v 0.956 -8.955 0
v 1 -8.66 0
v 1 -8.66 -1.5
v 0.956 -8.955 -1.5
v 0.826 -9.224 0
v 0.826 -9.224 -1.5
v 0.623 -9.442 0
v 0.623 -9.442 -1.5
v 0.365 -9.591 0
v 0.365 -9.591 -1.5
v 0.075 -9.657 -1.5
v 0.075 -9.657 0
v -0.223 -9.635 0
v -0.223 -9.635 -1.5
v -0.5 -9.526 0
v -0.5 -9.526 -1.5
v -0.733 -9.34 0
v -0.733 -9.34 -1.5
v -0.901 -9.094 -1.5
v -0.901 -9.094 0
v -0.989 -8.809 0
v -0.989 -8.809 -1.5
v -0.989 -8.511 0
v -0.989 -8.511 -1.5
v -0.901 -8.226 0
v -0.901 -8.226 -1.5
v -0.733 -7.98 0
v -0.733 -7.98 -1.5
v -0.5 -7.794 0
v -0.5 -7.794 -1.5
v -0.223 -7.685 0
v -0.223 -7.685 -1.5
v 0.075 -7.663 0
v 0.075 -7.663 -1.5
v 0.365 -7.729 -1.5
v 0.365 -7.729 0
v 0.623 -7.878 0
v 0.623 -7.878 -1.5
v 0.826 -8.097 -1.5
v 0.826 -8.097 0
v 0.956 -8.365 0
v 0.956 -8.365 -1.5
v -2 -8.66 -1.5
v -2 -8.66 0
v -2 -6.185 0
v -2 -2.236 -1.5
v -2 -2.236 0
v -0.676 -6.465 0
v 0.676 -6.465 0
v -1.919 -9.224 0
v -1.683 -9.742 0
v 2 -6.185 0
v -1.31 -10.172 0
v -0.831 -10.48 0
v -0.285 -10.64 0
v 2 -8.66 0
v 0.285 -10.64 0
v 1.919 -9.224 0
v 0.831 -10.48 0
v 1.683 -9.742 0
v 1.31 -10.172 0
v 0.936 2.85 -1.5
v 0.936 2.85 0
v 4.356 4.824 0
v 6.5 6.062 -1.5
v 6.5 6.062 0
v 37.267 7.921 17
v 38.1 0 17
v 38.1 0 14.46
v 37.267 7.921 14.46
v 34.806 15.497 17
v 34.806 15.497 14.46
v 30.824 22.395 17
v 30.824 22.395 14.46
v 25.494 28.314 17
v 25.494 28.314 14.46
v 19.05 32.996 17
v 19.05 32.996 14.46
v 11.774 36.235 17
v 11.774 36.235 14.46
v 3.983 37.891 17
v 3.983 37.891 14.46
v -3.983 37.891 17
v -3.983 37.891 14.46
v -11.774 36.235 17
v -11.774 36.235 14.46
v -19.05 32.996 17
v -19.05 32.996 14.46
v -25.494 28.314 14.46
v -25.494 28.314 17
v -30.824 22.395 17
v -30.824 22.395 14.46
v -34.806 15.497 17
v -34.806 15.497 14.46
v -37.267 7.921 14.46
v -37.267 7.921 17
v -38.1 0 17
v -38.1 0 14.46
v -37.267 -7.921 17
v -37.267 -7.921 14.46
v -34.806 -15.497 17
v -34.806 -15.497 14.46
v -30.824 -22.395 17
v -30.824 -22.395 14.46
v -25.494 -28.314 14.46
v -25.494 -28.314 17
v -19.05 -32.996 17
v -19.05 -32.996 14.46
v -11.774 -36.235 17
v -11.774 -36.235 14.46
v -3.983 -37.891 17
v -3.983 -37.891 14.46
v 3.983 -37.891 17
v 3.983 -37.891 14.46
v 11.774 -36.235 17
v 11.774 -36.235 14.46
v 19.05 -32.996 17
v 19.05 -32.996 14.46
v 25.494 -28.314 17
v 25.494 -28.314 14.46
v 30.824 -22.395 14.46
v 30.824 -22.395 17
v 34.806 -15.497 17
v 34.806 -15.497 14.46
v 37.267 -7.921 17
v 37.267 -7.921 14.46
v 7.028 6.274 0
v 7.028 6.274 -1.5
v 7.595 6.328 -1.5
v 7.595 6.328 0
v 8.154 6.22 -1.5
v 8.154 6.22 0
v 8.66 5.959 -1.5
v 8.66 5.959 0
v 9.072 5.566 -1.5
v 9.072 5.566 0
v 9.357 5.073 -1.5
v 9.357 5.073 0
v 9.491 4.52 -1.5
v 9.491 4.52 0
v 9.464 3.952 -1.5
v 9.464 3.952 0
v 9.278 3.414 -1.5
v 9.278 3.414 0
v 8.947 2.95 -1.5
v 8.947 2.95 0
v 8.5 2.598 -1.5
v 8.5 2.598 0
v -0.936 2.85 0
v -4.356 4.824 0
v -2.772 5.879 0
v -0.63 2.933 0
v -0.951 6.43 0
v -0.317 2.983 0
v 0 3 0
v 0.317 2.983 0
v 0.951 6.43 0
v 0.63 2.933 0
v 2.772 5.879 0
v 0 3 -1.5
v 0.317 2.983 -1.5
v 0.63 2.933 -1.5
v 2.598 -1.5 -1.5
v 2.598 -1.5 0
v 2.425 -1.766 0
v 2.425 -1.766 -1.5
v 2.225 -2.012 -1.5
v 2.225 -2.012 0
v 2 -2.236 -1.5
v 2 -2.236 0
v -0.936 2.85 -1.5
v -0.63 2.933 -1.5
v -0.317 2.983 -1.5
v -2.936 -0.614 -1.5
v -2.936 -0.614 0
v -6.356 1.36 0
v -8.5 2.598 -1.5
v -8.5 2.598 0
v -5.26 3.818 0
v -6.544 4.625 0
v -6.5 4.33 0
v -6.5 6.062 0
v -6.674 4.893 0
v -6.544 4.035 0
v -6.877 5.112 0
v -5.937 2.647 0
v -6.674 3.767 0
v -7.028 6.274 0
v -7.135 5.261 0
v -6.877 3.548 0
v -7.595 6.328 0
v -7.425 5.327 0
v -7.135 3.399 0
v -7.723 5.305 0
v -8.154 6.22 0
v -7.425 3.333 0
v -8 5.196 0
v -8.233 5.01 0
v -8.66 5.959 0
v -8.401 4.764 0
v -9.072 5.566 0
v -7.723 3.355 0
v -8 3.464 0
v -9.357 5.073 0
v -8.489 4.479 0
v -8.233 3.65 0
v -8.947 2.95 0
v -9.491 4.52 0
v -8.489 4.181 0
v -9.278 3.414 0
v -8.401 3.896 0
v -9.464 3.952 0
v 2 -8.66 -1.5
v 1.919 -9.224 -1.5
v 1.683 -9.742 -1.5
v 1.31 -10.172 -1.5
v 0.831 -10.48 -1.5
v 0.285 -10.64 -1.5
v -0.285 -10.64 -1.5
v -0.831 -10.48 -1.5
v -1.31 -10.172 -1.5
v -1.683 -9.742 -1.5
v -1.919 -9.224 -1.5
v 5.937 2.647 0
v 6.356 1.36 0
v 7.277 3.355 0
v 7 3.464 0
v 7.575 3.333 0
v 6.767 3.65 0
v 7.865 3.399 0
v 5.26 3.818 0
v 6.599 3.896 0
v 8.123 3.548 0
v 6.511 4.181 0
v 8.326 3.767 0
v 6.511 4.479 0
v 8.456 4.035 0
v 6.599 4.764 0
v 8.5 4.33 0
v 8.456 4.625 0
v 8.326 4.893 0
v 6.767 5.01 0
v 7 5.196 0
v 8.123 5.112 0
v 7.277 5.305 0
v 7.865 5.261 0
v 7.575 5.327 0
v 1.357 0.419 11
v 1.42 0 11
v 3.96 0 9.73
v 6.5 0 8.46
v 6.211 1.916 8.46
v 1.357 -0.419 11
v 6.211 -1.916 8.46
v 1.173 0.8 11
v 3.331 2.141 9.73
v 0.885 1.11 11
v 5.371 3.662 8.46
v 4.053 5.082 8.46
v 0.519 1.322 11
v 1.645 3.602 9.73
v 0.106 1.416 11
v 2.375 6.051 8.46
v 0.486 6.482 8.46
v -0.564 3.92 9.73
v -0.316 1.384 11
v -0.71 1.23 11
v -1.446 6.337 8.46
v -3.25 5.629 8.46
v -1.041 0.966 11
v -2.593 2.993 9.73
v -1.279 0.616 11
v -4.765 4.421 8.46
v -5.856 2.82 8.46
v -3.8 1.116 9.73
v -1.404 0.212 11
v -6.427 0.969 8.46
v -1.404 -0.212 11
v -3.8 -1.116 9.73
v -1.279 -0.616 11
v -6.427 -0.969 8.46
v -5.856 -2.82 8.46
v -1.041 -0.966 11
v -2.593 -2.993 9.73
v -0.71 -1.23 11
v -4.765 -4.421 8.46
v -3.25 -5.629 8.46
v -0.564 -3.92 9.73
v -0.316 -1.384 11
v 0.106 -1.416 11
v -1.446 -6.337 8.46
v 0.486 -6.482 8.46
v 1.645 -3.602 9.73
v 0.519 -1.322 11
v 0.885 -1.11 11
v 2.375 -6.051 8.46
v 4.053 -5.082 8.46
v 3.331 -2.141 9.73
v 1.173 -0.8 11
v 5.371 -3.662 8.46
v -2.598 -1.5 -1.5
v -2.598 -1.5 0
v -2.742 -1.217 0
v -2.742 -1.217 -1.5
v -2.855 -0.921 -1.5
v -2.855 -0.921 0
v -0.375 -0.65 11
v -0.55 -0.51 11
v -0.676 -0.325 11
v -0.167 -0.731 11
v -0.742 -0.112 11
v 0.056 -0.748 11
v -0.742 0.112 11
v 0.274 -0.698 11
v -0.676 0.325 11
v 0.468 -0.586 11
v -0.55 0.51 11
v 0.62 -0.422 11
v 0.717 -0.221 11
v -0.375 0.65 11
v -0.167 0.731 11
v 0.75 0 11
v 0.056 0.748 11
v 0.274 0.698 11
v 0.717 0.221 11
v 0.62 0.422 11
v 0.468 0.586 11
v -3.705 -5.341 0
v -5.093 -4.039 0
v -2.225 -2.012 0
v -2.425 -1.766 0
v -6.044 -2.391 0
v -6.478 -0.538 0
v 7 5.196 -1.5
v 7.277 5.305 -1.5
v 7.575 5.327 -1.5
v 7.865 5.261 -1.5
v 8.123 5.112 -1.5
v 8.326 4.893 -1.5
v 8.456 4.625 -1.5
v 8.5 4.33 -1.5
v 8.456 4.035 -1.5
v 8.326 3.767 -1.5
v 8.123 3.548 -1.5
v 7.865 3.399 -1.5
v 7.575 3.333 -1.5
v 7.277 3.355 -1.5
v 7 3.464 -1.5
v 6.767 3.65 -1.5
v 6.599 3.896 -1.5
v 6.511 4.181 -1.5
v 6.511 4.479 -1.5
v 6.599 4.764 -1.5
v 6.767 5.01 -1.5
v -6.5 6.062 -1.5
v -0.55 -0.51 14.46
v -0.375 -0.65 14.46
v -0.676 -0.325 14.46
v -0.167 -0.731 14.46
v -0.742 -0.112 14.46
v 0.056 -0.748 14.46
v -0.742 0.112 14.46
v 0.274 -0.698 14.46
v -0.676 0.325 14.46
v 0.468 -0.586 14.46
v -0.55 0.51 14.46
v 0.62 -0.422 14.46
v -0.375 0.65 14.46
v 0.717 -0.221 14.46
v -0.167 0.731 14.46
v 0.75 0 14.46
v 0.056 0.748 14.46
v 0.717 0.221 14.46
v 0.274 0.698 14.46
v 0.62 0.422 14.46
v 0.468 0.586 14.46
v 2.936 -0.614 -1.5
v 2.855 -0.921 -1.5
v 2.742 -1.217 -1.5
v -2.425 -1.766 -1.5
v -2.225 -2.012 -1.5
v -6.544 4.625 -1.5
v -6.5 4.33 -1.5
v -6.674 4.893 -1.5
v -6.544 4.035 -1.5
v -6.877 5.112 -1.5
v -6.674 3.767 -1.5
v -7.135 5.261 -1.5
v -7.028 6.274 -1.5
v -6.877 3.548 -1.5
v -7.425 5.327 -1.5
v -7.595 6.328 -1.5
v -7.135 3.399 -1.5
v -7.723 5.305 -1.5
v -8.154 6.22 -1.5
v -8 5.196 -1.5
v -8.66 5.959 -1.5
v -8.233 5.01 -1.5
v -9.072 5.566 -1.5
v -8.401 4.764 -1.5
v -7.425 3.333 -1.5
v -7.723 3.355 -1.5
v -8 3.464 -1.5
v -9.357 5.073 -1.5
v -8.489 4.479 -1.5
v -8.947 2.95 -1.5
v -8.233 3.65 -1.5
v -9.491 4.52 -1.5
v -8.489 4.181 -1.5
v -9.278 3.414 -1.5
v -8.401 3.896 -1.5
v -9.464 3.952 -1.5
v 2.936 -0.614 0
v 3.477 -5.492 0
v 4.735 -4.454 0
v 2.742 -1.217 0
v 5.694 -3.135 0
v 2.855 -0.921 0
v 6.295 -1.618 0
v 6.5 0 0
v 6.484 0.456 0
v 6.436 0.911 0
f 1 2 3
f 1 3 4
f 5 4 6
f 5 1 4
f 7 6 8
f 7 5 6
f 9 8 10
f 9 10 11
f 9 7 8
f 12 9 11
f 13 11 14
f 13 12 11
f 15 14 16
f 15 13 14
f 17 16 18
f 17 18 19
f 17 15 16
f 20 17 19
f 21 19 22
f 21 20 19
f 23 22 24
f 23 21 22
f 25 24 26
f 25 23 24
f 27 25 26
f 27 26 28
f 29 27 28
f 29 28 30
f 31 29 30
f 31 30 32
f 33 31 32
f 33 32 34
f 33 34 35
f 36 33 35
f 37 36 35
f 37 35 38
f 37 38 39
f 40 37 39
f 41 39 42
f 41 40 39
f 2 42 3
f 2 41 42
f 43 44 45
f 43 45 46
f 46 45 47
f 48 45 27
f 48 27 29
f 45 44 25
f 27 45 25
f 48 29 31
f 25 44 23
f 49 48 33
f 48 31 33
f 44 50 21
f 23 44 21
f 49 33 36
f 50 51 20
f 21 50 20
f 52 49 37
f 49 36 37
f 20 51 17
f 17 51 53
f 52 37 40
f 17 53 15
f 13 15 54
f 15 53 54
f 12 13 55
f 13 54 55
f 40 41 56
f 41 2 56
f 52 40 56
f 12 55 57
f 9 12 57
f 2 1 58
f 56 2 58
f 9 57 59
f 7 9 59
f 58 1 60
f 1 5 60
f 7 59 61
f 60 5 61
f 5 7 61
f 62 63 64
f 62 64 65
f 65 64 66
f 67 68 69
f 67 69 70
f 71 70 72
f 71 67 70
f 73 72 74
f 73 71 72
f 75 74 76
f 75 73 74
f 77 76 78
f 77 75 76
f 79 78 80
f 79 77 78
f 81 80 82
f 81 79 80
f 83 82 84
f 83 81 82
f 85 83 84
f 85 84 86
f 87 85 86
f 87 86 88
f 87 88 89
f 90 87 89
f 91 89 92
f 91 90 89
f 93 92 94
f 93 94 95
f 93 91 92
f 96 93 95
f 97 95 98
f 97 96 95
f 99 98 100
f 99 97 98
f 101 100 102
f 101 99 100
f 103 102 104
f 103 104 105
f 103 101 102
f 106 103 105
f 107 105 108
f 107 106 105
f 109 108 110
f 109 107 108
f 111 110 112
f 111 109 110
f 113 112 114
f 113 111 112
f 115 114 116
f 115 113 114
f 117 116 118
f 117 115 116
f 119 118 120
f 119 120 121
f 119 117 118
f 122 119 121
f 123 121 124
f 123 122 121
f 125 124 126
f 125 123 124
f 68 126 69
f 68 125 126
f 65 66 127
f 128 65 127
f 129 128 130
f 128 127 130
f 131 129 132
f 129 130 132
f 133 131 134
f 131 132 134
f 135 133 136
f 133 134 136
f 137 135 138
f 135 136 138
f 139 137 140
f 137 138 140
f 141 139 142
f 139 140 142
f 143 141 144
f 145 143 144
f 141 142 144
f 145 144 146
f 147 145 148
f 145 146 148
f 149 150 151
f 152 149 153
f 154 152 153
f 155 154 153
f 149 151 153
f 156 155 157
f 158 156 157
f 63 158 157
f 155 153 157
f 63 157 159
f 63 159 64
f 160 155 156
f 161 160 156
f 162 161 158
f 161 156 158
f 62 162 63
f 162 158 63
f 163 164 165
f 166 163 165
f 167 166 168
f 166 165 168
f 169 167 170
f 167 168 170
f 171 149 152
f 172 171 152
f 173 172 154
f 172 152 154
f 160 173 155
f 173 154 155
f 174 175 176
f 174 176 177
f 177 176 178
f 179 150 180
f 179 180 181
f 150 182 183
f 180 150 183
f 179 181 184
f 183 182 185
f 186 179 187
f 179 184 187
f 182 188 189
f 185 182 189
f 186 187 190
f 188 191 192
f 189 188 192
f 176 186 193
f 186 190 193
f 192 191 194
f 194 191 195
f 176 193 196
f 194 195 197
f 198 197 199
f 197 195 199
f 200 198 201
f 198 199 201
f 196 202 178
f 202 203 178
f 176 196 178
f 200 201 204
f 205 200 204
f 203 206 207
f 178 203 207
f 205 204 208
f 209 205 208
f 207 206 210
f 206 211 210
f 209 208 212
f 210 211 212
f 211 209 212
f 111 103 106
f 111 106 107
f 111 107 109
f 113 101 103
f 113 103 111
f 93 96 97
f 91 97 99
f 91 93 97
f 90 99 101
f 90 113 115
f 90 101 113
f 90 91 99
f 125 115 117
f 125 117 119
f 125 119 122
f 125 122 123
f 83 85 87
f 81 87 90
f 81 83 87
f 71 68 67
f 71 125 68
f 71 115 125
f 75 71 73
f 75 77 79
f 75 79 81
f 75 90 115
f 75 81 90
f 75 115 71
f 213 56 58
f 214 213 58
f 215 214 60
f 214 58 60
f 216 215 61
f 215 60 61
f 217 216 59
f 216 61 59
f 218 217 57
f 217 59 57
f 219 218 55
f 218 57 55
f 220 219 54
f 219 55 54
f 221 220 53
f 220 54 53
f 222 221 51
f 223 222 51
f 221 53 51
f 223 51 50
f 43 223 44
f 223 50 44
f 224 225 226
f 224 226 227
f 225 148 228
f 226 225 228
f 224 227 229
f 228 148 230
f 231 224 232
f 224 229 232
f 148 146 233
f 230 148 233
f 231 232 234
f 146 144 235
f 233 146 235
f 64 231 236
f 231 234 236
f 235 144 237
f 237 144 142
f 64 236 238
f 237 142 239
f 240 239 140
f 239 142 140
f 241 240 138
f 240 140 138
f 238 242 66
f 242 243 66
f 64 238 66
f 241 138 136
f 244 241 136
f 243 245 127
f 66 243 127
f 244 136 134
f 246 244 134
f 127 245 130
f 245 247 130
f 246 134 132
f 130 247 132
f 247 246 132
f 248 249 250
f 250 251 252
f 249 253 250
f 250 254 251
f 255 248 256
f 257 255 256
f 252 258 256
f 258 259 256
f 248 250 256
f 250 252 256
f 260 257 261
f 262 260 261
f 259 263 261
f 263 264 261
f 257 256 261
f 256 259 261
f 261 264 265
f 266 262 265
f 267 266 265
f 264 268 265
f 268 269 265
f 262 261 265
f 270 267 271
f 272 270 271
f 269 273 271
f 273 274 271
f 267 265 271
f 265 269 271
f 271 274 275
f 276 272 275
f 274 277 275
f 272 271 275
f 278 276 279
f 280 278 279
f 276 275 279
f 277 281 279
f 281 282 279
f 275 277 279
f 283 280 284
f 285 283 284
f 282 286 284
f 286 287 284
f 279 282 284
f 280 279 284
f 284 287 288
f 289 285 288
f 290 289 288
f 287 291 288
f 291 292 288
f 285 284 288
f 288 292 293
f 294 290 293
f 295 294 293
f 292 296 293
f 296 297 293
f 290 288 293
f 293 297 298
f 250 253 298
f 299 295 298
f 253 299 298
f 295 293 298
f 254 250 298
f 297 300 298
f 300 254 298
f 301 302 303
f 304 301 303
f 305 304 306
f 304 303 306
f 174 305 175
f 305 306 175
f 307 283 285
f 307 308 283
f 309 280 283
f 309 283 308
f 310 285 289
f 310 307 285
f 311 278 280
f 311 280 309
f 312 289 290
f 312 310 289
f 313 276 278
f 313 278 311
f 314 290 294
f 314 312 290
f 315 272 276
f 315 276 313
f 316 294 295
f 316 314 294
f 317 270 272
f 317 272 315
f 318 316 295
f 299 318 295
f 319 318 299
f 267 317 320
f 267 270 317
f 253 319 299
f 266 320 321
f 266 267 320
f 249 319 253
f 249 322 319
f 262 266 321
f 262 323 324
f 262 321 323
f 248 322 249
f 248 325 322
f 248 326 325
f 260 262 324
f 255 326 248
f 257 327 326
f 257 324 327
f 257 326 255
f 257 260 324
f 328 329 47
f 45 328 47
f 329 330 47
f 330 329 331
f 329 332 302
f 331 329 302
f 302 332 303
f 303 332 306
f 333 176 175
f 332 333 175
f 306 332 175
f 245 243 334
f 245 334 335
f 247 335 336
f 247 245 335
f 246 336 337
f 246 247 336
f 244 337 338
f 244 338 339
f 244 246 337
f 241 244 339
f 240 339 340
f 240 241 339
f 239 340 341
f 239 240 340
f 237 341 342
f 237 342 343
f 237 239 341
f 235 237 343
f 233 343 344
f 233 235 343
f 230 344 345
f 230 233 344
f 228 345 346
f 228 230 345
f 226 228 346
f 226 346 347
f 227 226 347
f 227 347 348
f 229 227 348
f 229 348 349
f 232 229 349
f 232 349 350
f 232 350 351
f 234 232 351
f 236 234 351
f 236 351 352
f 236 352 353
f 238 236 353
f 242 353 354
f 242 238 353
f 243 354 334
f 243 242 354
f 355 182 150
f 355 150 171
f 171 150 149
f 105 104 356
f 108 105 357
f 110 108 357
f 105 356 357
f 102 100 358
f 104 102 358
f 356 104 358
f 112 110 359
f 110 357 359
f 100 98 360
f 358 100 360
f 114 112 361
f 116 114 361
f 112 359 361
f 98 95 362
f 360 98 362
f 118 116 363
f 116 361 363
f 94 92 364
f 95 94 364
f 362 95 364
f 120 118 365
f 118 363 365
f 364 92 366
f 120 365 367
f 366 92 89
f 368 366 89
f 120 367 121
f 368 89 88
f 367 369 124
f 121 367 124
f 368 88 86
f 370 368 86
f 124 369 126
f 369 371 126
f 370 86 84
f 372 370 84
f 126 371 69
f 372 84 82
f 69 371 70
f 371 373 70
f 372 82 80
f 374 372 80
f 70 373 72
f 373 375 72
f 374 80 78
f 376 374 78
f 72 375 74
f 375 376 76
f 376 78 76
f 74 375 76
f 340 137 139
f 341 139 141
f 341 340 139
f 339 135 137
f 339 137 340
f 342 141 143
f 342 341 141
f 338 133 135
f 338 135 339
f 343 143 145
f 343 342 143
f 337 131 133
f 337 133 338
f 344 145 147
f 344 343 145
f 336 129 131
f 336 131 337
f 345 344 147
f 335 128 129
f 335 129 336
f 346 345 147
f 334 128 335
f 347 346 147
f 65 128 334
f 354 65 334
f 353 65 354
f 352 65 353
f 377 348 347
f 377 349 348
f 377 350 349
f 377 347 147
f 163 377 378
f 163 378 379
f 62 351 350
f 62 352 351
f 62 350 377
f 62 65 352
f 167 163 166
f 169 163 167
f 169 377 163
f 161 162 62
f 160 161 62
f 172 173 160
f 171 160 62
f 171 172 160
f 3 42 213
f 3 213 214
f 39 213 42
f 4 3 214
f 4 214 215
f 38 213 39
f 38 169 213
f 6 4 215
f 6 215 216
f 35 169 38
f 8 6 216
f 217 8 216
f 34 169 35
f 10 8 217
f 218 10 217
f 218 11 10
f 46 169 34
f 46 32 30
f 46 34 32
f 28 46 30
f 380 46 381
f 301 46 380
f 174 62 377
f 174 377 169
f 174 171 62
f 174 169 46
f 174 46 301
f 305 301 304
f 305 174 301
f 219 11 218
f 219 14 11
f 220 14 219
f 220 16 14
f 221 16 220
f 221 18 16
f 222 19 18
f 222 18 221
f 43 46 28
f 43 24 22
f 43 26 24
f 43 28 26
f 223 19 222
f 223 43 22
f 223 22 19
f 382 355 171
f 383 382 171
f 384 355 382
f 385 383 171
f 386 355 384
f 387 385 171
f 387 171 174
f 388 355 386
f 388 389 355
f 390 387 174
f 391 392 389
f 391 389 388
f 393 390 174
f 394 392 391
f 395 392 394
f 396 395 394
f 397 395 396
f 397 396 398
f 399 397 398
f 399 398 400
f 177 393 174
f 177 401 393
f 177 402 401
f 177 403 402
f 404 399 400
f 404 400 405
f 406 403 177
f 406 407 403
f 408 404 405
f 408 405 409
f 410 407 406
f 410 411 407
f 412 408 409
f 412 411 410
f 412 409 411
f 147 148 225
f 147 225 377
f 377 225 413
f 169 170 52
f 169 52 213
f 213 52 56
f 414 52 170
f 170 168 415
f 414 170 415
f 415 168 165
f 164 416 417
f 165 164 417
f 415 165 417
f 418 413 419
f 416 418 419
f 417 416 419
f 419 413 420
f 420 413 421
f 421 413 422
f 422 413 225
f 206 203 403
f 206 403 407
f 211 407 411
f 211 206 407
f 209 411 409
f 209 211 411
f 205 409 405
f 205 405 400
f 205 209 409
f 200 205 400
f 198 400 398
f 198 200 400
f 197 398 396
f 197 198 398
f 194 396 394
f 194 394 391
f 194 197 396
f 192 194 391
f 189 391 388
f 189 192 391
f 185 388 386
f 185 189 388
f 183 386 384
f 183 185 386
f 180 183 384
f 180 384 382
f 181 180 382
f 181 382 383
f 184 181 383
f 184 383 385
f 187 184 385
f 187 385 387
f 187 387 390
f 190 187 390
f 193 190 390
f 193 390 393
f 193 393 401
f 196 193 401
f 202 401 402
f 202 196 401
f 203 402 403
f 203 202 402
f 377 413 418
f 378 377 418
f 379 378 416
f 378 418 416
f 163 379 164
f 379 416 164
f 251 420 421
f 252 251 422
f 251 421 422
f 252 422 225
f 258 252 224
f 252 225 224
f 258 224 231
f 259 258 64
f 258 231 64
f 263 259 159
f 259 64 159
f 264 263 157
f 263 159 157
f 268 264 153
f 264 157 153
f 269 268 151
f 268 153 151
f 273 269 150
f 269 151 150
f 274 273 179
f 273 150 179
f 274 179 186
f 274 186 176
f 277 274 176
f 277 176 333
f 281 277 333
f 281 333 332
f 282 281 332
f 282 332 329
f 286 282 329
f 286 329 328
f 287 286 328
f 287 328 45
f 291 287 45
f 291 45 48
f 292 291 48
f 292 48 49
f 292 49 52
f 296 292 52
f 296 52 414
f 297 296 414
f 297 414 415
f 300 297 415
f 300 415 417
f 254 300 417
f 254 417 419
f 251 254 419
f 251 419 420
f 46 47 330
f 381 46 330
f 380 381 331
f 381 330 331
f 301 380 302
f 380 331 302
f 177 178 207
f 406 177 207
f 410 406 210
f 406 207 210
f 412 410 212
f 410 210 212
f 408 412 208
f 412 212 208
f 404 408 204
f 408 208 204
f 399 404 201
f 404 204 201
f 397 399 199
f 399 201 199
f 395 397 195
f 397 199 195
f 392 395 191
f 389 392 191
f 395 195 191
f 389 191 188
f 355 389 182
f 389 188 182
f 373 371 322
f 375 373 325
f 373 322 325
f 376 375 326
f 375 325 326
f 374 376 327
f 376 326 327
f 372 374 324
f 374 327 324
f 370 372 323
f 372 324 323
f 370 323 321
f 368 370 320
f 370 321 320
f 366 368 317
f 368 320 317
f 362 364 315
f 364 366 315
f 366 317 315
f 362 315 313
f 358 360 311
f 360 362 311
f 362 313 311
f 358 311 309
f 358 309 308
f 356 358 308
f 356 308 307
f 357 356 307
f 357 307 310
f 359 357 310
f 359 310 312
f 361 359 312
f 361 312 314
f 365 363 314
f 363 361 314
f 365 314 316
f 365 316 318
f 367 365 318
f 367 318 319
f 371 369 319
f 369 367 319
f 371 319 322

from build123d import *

# Parameters (mm, degrees)
F0_R            = 6.5
F1_DEPTH        = 11
F2_R            = 0.75
F3_DEPTH        = 6
F4_R            = 1
F5_DEPTH        = 1.5
F5_COPIES_COUNT = 3
F6_SIZE2        = 2.54
F6_SIZE         = 5.08
F7_R            = 38.1
F8_DEPTH        = 2.54


# Not quite as in the source:
# - a pattern or mirror of a feature is missing from the dataset's text; its kind, count and spacing are read off the source's solid


with BuildPart() as f1:
    # F0 (on Top) → F1 (new body)
    with BuildSketch(Plane.XY):
        Circle(F0_R)
    extrude(amount=F1_DEPTH)

    # F2 (on face) → F3 (join)
    with BuildSketch(Plane.XY.offset(11)):
        Circle(F2_R)
    extrude(amount=F3_DEPTH)

    # F4 (on face) → F5 (join)
    with BuildSketch(Plane(origin=(0, 0, 0), x_dir=(1, 0, 0), z_dir=(0, 0, -1))):
        with BuildLine():
            ThreePointArc((2, 8.6602540378), (0, 10.6602540378), (-2, 8.6602540378))
            Line((-2, 8.6602540378), (-2, 2.2360679775))
            ThreePointArc((-2, 2.2360679775), (-2.3283095216, 1.8918178485), (-2.5980762114, 1.5))
            Line((-2.5980762114, 1.5), (0, 0))
            Line((0, 0), (2.5980762114, 1.5))
            ThreePointArc((2.5980762114, 1.5), (2.3283095216, 1.8918178485), (2, 2.2360679775))
            Line((2, 2.2360679775), (2, 8.6602540378))
        make_face()
        with Locations((0, 8.6602540378)):
            Circle(F4_R, mode=Mode.SUBTRACT)
    f5 = extrude(amount=F5_DEPTH)

    # F5_copies: F5 ×3 about axis
    f5_copies_axis = Axis((0, 0, 0), (0, 0, 1))
    for i in range(1, F5_COPIES_COUNT):
        add(f5.rotate(f5_copies_axis, i * 360 / F5_COPIES_COUNT))

    # F6
    f6_edges = [f1.edges().sort_by_distance(p)[0] for p in [
        (-6.5, 0, 11),
    ]]
    f6_side = f1.faces().sort_by_distance((-6.316152, 0, 11))[0]
    chamfer(f6_edges, length=F6_SIZE, length2=F6_SIZE2, reference=f6_side)

    # F7 (on face) → F8 (join)
    with BuildSketch(Plane.XY.offset(17)):
        Circle(F7_R)
    extrude(amount=-F8_DEPTH)


solid = f1.part
